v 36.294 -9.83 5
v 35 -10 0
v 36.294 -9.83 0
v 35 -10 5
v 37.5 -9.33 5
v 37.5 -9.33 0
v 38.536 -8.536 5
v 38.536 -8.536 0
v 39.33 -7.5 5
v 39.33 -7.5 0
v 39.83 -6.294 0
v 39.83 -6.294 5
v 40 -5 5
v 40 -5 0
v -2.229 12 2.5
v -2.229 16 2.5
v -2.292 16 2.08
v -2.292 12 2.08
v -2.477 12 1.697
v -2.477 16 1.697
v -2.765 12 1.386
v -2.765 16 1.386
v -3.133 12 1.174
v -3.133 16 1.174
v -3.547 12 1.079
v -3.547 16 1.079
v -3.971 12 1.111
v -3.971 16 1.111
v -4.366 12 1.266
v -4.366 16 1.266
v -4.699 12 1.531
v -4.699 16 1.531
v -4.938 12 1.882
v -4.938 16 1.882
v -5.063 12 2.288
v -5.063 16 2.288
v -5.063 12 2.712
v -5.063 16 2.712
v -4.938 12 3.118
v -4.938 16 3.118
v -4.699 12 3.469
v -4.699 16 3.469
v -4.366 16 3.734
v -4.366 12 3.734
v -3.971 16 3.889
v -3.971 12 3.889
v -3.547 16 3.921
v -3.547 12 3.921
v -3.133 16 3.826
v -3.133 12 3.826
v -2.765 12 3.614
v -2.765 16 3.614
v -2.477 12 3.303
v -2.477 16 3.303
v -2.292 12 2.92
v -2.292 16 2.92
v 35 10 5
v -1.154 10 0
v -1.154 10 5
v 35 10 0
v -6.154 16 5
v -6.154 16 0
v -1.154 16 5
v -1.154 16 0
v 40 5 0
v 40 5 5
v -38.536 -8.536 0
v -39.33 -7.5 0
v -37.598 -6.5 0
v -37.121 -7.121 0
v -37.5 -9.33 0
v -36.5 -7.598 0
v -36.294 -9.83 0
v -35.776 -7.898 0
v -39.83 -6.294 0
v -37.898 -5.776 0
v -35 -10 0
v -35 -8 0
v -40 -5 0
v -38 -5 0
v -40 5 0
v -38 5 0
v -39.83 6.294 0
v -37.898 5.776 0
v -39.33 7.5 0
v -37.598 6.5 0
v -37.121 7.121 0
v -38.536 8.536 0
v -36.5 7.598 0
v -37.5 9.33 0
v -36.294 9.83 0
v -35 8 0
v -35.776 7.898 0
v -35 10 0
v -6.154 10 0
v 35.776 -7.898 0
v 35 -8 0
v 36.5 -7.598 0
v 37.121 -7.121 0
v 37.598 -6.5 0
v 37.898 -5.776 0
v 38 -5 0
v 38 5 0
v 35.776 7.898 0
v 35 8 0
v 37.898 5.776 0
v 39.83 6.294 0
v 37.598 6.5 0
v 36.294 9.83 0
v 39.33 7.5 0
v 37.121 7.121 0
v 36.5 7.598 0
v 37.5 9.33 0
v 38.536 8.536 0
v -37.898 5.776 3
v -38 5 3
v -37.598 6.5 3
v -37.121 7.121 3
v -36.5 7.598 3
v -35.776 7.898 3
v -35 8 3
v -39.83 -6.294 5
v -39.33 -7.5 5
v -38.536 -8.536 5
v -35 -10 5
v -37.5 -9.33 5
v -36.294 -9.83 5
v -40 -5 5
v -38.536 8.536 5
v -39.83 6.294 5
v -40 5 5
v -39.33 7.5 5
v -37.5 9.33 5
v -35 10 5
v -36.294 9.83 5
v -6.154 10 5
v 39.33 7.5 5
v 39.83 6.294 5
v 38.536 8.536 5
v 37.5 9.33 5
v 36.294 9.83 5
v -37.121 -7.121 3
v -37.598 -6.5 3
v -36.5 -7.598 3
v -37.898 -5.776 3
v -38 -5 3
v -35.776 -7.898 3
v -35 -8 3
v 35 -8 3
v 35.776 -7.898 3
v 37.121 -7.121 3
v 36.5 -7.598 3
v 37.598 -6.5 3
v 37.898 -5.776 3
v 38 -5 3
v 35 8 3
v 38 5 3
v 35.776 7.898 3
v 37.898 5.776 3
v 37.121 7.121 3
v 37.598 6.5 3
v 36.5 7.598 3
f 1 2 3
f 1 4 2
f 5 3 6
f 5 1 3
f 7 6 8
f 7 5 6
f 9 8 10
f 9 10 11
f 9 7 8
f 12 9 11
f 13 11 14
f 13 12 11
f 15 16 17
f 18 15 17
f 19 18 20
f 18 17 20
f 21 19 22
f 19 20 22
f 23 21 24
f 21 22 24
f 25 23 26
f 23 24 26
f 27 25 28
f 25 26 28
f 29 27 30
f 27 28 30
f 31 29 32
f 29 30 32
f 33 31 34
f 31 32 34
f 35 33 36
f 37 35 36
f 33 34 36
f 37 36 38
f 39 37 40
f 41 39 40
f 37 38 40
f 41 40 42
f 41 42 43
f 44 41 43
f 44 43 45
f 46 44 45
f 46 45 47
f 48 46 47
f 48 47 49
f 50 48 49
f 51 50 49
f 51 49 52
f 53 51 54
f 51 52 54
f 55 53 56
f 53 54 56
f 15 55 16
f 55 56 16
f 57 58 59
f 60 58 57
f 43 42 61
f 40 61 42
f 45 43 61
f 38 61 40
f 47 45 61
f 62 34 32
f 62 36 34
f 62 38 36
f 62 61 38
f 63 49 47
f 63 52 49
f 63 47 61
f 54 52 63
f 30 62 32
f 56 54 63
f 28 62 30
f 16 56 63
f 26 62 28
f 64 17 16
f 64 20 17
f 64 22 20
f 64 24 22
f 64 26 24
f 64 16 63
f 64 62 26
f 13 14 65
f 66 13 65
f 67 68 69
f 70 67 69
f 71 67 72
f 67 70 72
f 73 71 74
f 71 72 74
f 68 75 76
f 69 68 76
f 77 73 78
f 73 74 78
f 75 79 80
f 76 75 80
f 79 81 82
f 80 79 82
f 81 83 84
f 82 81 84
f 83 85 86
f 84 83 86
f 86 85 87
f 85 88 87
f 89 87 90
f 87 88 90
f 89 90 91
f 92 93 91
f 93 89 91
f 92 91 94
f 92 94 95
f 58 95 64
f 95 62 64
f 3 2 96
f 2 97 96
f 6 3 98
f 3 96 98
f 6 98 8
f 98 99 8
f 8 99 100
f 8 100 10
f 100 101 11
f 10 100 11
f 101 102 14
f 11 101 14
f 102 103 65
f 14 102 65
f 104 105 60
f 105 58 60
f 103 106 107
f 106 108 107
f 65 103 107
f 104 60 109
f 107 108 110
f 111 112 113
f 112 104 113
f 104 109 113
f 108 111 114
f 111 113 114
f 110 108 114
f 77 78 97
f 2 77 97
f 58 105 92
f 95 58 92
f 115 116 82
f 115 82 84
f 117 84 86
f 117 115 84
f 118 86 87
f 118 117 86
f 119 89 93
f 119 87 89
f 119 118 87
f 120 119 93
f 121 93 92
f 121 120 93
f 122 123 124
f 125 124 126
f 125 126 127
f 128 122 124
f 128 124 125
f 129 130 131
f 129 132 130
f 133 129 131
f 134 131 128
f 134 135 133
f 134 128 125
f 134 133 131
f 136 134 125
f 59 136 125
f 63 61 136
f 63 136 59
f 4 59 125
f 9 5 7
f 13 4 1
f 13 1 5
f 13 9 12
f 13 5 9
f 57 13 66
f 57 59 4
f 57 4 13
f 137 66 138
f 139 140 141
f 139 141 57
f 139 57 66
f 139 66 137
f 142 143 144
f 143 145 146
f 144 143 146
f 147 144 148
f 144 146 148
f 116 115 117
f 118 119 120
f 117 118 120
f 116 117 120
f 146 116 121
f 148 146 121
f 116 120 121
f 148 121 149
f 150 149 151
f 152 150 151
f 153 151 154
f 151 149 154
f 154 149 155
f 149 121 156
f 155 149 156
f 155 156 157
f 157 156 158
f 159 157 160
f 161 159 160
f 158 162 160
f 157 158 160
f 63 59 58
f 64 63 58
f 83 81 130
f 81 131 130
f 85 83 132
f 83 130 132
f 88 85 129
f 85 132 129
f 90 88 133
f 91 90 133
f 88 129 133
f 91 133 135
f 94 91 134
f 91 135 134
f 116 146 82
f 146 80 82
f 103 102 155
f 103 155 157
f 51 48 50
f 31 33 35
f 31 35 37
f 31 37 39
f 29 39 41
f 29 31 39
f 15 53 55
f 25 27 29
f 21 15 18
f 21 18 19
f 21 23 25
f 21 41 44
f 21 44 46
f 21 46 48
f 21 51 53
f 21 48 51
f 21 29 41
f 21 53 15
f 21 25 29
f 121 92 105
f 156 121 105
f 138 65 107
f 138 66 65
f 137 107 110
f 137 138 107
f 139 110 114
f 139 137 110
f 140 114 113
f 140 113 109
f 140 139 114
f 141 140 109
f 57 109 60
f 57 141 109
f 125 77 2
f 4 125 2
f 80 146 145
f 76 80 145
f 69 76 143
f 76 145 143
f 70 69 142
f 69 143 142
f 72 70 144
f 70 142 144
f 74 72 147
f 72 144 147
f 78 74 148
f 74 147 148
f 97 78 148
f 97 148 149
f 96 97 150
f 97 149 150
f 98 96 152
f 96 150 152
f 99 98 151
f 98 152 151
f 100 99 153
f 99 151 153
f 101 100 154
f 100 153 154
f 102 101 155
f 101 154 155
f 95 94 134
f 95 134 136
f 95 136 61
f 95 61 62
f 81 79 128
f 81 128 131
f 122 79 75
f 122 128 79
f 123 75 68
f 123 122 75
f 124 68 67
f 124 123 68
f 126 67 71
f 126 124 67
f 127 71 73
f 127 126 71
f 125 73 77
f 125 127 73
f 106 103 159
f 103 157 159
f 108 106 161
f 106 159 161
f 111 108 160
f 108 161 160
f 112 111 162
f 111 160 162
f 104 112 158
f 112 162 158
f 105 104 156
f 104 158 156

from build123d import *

# Parameters (mm, degrees)
SKETCH1_W           = 80
SKETCH1_H           = 20
BOSS_EXTRUDE1_DEPTH = 5
FILLET1_R           = 5
SHELL1_T            = -2
SKETCH2_W           = 5
SKETCH2_H           = 5
BOSS_EXTRUDE2_DEPTH = 6
SKETCH3_R           = 1.425
CUT_EXTRUDE1_DEPTH  = 4


with BuildPart() as part:
    # Sketch1 → Boss-Extrude1 (new body)
    with BuildSketch(Plane.XY):
        Rectangle(SKETCH1_W, SKETCH1_H)
    extrude(amount=BOSS_EXTRUDE1_DEPTH)

    # Fillet1
    fillet1_edges = [part.edges().sort_by_distance(p)[0] for p in [
        (40, -10, 2.5),
        (-40, -10, 2.5),
        (-40, 10, 2.5),
        (40, 10, 2.5),
    ]]
    fillet(fillet1_edges, radius=FILLET1_R)

    # Shell1
    shell1_openings = [part.faces().sort_by_distance(p)[0] for p in [
        (0, 0, 0),
    ]]
    offset(amount=SHELL1_T, openings=shell1_openings, kind=Kind.INTERSECTION)

    # Sketch2 → Boss-Extrude2 (add)
    with BuildSketch(Plane(origin=(0, 10, 0), x_dir=(1, 0, 0), z_dir=(0, 1, 0))):
        with Locations((-3.653953893, -2.5)):
            Rectangle(SKETCH2_W, SKETCH2_H)
    extrude(amount=BOSS_EXTRUDE2_DEPTH)

    # Sketch3 → Cut-Extrude1 (cut)
    with BuildSketch(Plane(origin=(0, 16, 0), x_dir=(1, 0, 0), z_dir=(0, 1, 0))):
        with Locations((-3.653953893, -2.5)):
            Circle(SKETCH3_R)
    extrude(amount=-CUT_EXTRUDE1_DEPTH, mode=Mode.SUBTRACT)


solid = part.part
